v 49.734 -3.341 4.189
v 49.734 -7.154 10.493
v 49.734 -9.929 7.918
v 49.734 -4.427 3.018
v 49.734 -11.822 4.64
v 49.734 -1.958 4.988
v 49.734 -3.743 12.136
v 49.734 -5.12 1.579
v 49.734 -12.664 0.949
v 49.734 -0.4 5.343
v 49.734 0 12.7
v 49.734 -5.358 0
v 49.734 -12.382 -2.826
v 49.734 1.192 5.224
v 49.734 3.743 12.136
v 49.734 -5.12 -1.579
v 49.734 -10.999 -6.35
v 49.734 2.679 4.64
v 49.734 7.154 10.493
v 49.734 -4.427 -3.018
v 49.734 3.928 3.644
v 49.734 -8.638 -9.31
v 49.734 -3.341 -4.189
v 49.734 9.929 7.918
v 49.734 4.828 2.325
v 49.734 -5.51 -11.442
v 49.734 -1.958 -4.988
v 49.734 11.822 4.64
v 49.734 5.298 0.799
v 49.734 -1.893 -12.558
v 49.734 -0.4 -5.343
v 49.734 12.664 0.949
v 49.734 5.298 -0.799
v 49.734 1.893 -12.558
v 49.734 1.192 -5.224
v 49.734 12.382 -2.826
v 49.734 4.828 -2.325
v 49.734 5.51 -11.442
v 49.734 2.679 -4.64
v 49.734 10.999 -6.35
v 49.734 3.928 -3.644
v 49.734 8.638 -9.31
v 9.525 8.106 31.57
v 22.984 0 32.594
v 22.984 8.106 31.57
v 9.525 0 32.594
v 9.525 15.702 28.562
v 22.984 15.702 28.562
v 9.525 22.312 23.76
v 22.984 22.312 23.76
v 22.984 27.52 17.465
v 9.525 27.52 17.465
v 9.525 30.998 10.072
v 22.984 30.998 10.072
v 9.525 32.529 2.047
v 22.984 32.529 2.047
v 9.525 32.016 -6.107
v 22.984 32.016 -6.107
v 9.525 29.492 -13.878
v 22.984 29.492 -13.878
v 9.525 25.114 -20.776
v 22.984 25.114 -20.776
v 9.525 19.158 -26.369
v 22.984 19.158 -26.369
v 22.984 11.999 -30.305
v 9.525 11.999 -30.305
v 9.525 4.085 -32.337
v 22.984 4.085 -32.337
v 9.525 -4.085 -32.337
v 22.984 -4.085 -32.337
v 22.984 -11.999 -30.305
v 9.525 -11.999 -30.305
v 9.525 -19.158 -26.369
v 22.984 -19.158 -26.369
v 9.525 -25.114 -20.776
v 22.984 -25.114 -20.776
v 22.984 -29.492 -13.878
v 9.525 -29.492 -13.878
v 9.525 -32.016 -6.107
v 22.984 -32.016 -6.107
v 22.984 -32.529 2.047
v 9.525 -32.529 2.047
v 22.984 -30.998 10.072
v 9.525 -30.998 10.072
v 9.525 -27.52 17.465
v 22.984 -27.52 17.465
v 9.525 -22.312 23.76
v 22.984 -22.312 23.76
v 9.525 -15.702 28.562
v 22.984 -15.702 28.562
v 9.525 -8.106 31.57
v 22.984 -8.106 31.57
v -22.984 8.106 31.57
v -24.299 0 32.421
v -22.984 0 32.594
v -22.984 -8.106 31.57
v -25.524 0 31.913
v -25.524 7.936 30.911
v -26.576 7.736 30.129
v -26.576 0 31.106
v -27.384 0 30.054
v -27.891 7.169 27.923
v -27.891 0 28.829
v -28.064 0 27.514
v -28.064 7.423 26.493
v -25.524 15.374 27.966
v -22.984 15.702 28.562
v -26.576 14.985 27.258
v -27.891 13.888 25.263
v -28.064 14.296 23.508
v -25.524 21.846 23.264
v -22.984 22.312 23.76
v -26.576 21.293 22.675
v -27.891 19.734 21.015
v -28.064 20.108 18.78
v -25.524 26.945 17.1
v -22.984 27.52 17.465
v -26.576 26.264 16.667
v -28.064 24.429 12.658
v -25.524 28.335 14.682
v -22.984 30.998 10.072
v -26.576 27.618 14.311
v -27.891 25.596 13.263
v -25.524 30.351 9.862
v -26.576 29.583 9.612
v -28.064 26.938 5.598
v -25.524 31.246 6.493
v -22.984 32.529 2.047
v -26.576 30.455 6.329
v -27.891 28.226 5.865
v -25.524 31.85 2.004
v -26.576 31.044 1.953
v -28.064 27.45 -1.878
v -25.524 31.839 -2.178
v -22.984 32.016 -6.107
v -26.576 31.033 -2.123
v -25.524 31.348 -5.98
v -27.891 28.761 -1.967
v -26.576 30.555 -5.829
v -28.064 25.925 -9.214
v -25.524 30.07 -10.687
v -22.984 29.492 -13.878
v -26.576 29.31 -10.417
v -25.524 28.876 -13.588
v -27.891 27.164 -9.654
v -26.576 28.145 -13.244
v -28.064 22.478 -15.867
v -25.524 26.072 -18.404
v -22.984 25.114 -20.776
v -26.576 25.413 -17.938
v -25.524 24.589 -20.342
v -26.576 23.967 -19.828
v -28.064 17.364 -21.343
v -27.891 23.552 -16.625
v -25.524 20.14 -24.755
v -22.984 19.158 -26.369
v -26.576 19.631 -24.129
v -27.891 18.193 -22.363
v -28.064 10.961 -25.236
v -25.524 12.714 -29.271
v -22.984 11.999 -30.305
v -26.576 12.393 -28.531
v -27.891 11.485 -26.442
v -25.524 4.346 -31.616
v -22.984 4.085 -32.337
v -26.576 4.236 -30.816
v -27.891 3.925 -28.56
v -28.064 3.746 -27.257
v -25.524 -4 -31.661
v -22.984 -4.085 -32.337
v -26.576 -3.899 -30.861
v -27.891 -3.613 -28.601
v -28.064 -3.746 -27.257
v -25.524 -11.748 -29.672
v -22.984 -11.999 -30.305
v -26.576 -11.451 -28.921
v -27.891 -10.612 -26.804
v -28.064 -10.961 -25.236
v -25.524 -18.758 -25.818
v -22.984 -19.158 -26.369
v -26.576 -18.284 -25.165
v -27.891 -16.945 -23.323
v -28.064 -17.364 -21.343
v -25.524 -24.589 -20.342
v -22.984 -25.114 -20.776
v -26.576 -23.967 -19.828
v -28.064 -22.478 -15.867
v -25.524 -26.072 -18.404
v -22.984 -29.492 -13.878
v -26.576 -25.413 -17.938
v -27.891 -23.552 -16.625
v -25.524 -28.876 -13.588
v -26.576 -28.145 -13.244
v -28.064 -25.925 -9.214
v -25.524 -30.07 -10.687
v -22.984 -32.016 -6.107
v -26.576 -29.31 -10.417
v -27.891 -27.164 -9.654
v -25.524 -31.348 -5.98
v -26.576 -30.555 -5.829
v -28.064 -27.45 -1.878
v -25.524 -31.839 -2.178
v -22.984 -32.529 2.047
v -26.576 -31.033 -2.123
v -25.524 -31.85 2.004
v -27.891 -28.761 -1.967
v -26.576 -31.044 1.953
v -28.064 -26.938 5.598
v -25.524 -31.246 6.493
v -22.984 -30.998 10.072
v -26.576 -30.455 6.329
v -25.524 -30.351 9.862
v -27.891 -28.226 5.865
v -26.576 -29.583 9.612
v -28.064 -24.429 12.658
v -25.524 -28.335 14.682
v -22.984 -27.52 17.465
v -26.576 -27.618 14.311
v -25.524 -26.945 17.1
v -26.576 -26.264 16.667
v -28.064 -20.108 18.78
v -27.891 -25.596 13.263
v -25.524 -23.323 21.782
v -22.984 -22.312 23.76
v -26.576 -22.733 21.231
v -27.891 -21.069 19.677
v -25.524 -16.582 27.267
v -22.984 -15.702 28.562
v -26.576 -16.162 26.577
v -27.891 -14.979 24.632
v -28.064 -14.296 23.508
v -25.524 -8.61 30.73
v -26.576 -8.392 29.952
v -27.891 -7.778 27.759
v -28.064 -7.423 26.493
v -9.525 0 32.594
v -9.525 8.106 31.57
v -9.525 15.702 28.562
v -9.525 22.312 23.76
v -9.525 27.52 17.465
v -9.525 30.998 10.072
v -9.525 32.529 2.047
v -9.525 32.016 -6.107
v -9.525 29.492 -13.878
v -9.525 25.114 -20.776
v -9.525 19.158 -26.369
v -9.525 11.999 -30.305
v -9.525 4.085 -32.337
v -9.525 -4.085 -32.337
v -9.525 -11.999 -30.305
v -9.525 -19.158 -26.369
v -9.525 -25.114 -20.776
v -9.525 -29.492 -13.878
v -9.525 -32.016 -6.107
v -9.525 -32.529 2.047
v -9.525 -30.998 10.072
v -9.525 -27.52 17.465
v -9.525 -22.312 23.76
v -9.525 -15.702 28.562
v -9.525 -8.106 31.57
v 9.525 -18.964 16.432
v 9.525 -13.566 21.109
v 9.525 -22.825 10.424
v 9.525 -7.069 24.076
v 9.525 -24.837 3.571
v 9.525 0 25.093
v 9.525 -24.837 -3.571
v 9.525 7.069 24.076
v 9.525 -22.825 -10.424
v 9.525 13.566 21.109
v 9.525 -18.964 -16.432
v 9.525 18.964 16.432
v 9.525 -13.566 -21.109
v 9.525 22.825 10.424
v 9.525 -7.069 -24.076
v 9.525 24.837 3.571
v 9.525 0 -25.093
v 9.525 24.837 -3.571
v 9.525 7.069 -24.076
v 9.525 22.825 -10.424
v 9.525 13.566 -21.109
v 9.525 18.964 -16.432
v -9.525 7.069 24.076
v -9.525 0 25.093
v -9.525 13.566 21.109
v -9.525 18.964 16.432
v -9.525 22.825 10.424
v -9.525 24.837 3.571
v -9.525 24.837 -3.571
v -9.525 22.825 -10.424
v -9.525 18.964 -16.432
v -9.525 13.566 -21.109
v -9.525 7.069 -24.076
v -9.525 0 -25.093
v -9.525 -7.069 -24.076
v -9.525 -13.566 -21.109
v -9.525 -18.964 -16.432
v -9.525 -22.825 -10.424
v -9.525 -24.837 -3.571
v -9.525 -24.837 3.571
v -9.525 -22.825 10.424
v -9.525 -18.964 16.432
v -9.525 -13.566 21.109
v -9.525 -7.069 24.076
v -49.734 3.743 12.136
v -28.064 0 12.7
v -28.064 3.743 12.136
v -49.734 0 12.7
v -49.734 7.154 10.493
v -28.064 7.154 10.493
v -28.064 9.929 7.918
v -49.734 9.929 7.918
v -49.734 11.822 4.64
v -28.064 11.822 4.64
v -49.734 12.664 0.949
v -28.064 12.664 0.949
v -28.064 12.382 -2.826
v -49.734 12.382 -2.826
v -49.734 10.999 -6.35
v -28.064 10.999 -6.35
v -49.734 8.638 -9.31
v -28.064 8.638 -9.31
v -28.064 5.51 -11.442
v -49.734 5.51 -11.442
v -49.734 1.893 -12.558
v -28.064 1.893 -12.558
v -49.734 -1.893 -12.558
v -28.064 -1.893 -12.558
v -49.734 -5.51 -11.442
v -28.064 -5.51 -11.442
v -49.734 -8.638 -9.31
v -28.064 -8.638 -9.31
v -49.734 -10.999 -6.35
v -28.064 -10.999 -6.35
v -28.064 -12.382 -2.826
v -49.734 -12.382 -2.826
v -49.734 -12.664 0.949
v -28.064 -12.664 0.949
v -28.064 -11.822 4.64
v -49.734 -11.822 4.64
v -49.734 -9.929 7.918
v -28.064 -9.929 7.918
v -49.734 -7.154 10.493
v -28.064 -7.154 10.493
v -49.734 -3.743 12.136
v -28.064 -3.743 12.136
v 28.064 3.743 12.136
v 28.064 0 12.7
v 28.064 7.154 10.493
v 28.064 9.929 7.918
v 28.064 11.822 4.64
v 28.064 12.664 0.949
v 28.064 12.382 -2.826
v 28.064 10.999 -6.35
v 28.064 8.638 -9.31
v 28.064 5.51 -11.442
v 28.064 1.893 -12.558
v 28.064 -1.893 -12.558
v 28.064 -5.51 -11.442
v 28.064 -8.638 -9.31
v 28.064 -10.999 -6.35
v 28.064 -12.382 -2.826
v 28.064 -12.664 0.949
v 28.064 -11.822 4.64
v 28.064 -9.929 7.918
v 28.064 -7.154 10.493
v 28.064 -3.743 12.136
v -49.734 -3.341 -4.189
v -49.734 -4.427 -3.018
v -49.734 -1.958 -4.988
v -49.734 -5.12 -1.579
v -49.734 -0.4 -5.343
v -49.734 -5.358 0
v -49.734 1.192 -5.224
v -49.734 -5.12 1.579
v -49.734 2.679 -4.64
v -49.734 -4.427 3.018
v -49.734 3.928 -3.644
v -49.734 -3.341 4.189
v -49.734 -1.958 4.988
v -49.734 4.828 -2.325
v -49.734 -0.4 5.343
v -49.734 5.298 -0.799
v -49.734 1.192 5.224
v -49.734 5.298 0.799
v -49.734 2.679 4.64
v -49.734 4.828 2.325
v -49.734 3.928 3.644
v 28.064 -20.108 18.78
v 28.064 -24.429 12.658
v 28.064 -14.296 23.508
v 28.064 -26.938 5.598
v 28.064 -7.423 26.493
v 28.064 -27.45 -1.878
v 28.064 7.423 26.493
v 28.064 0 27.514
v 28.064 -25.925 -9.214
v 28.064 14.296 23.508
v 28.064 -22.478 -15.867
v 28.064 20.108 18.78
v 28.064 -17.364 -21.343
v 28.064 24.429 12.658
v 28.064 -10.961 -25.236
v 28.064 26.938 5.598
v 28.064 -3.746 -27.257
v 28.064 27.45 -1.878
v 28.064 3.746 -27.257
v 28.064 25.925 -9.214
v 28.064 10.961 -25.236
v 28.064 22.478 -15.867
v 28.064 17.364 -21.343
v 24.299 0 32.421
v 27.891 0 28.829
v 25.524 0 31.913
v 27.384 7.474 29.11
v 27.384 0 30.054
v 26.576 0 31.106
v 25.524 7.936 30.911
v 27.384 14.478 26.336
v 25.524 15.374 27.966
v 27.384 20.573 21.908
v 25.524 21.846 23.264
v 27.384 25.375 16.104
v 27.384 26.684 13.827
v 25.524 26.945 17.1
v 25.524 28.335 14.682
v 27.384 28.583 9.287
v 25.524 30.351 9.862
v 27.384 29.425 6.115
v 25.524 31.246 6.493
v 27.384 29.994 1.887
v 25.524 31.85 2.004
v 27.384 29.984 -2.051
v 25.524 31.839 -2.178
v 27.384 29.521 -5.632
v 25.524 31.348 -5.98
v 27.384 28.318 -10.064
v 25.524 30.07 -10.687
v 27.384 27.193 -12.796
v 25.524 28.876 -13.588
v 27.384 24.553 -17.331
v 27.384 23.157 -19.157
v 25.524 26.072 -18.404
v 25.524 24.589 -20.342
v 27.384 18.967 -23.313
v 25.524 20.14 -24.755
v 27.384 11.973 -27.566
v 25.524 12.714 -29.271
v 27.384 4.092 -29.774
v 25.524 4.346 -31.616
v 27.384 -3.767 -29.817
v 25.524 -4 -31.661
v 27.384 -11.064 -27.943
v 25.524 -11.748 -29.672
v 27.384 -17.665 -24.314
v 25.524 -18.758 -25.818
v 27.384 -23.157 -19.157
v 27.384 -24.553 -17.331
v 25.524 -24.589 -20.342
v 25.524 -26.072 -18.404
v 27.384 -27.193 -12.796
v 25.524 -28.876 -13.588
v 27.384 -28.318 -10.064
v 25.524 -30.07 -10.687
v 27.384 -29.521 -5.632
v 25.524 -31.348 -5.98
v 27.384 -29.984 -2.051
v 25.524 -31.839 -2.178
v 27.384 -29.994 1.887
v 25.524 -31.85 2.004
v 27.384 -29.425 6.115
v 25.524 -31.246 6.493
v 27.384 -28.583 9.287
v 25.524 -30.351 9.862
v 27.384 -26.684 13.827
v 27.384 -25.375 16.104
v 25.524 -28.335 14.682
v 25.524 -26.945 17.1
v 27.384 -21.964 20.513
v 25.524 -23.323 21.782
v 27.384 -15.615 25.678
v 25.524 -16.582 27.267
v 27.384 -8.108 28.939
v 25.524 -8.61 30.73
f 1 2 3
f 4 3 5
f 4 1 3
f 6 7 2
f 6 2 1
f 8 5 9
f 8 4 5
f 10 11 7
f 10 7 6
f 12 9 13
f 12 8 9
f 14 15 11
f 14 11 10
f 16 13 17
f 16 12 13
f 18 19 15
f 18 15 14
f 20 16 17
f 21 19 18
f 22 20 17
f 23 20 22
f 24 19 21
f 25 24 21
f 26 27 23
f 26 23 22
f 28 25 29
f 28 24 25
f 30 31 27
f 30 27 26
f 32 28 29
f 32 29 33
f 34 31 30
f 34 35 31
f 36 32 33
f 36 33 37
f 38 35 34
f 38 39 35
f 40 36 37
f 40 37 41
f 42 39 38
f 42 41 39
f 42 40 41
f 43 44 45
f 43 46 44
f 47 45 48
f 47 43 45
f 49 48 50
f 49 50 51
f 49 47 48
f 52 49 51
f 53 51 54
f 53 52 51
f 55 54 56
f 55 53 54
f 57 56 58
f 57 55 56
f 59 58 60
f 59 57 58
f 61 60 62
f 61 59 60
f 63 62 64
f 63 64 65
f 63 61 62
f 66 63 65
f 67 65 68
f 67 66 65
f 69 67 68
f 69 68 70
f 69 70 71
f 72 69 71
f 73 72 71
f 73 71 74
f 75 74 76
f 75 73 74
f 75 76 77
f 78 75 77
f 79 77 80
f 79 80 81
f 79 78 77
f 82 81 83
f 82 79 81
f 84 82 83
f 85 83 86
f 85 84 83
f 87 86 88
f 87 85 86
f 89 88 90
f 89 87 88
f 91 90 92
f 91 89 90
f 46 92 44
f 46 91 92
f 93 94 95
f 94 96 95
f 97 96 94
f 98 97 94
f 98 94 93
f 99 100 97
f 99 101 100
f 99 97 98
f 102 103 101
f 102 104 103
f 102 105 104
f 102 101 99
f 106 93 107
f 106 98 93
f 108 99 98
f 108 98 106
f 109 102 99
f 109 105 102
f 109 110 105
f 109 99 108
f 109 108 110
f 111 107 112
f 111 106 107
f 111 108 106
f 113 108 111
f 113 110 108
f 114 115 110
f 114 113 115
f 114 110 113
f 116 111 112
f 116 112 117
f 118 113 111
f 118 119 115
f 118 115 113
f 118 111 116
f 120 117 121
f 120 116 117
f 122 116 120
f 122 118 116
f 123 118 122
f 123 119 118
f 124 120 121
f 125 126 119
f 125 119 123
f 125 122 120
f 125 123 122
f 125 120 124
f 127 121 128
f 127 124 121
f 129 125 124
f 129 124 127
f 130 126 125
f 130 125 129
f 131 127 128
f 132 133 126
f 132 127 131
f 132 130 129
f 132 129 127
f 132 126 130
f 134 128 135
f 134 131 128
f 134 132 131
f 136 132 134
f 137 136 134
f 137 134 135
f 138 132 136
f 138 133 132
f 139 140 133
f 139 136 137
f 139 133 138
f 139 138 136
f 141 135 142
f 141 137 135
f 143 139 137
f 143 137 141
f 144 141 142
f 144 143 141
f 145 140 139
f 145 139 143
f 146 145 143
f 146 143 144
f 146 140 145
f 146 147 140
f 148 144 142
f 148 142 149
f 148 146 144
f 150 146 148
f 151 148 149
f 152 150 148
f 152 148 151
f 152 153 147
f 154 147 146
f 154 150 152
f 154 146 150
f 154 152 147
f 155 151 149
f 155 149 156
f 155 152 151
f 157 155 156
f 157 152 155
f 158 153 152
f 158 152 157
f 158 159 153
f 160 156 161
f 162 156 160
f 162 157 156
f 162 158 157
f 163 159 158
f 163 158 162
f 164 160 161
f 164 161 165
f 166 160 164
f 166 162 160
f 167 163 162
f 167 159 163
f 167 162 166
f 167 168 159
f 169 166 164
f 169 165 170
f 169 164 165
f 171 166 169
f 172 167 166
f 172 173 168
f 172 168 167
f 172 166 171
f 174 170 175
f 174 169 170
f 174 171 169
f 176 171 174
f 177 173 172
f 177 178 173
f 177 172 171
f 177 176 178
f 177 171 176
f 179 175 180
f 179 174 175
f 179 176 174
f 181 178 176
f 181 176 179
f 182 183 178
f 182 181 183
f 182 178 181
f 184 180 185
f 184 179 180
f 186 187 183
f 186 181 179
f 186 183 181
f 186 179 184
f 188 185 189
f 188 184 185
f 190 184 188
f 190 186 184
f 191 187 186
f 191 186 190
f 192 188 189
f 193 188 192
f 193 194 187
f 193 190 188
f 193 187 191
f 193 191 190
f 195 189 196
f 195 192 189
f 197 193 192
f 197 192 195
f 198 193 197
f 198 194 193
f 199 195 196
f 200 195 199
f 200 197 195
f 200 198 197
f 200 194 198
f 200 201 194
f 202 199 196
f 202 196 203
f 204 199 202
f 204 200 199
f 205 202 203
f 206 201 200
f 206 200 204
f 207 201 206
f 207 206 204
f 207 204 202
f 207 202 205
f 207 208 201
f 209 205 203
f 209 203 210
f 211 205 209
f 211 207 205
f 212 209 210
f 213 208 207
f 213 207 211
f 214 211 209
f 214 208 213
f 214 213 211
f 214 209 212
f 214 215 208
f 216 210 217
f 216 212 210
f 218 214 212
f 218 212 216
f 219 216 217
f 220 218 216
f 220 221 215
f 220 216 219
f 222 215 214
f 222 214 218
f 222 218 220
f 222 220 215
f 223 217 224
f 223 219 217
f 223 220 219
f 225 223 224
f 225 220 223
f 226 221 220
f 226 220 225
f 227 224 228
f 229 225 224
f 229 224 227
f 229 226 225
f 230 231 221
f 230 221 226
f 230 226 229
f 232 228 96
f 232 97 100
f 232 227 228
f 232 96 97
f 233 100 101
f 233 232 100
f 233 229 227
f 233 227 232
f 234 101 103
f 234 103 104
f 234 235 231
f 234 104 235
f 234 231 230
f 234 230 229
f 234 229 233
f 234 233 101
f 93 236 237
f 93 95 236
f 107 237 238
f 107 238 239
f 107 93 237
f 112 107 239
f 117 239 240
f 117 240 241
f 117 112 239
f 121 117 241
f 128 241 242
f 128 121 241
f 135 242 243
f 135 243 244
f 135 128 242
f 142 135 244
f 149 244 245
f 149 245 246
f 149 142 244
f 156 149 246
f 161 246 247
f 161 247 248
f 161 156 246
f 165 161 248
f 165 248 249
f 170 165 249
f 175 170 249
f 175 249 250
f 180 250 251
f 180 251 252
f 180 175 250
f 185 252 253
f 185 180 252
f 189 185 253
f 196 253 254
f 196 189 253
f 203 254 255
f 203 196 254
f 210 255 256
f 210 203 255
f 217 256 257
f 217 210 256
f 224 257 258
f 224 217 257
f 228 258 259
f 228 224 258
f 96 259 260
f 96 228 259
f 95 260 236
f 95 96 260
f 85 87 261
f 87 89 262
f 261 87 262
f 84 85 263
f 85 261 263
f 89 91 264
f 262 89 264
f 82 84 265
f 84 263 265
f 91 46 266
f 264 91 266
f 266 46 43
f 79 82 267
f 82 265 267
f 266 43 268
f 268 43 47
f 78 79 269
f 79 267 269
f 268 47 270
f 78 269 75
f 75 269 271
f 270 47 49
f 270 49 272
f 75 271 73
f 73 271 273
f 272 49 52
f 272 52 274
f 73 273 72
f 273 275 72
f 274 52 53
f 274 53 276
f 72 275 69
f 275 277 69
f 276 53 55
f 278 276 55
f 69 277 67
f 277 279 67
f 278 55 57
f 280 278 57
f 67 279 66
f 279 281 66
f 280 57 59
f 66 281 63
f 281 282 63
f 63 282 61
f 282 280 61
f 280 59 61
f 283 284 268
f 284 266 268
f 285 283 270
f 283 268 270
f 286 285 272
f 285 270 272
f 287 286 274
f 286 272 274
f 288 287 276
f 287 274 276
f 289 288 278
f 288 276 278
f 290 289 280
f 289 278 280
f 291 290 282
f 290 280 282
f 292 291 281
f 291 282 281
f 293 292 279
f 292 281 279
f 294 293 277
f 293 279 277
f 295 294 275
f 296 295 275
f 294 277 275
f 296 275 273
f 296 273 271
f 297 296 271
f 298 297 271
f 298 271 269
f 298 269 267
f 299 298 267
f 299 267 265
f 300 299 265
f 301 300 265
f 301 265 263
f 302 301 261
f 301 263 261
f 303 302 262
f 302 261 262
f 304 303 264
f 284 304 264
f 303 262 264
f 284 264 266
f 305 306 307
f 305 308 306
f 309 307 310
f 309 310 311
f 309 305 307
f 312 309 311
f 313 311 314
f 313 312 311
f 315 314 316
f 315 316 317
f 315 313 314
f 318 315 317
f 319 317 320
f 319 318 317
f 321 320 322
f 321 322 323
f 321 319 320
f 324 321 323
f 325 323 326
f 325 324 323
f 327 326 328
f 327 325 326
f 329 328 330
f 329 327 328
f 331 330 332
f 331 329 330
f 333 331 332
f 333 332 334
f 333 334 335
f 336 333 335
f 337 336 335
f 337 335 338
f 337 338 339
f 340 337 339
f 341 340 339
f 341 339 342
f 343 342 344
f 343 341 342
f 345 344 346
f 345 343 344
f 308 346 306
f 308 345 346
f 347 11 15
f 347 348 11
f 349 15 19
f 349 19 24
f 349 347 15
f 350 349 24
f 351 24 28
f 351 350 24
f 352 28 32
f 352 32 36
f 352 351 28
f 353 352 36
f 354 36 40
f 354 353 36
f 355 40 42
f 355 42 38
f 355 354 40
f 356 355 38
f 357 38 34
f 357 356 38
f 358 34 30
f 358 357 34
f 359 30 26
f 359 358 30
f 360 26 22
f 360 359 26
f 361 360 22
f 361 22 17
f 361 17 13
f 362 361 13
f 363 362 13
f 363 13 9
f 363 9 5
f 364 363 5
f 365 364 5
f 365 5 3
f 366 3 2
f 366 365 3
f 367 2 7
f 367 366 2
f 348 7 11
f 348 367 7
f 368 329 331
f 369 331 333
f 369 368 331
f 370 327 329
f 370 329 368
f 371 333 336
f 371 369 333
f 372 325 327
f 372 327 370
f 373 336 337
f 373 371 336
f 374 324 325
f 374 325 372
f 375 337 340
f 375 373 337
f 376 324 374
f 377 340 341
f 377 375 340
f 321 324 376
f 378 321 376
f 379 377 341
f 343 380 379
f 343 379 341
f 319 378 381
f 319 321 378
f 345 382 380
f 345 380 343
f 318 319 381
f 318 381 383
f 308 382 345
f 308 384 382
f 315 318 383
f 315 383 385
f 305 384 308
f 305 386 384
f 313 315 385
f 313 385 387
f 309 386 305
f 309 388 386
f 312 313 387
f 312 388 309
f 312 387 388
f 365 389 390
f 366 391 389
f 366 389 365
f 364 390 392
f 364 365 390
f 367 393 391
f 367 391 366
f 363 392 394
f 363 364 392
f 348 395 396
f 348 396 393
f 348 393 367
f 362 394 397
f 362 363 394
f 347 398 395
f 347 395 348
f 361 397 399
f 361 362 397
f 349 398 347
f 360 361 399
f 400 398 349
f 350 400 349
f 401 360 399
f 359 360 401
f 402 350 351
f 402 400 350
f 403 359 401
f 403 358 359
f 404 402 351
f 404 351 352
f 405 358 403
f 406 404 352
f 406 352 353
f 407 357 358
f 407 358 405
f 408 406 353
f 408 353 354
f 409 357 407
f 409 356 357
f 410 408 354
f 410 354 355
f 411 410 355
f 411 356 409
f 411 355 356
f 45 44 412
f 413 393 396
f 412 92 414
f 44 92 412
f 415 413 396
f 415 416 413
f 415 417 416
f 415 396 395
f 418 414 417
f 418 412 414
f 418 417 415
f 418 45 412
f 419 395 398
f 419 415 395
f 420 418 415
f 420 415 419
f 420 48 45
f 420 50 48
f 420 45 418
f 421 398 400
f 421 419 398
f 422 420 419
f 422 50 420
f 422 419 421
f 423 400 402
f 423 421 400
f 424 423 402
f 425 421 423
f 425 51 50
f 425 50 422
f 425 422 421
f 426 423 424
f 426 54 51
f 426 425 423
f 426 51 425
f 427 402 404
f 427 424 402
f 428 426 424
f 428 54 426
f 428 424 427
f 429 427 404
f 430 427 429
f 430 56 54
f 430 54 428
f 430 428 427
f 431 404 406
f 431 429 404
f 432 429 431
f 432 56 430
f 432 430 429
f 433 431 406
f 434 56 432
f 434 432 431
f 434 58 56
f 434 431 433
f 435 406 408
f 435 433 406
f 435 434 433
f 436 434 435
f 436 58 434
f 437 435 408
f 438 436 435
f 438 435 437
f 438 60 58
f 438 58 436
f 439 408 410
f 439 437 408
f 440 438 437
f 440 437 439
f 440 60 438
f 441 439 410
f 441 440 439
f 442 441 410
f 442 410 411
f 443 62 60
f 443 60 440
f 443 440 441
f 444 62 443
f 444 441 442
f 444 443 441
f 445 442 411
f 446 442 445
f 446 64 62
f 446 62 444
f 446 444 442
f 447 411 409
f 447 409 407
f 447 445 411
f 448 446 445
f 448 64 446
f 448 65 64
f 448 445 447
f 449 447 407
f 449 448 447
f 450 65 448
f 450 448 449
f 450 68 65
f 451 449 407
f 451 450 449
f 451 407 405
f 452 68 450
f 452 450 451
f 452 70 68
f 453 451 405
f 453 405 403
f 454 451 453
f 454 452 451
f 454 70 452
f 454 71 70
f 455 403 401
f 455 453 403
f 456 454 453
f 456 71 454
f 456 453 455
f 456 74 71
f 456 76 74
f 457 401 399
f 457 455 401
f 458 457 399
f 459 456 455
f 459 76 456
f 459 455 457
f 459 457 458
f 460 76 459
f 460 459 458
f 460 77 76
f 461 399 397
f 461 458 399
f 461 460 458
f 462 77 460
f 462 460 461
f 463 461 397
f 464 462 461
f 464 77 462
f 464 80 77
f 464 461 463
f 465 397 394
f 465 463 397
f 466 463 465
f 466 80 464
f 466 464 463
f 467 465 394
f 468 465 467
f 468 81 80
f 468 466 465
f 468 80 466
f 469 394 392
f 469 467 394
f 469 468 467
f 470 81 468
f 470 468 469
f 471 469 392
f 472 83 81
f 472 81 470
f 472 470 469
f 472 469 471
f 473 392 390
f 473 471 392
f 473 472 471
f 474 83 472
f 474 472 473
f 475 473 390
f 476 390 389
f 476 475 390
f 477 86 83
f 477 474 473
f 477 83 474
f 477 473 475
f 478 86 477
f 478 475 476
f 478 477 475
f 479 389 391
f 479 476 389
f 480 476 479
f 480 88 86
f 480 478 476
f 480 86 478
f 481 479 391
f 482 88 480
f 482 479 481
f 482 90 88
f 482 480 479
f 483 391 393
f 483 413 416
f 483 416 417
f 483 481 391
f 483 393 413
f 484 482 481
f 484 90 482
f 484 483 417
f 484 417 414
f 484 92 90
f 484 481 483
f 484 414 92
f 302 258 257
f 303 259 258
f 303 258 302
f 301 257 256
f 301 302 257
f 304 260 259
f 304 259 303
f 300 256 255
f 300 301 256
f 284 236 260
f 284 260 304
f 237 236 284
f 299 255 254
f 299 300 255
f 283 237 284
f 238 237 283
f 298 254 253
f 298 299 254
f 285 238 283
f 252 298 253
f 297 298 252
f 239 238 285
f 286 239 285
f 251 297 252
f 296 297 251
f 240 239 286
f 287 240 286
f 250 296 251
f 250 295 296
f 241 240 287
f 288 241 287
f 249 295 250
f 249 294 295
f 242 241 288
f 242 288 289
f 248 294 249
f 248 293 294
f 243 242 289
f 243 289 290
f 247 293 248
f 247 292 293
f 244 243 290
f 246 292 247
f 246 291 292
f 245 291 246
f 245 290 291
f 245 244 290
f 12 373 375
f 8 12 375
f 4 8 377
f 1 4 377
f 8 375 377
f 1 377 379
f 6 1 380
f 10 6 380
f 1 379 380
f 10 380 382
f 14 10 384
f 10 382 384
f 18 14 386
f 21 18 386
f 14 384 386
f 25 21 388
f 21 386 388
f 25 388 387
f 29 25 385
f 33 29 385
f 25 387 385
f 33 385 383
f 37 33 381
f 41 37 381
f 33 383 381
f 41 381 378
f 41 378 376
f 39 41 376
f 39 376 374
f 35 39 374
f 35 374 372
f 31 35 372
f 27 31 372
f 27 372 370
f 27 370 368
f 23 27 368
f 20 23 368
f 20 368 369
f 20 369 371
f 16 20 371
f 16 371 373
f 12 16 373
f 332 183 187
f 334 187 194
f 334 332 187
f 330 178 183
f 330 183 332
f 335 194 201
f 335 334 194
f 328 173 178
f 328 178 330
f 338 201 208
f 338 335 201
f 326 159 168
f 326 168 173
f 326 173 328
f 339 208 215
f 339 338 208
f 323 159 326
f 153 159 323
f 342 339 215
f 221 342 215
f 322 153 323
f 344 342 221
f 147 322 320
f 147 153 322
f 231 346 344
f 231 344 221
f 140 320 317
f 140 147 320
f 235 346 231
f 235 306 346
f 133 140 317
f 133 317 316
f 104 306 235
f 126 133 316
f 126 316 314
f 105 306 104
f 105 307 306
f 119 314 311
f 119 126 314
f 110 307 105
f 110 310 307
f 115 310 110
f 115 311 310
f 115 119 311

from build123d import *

# Parameters (mm, degrees)
F2_R = 5.08
F3_W = 19.05
F3_H = 9.8322601712
F6_D = 10.71626


with BuildPart() as f1:
    # F0 (on Front) → F1 (revolve)
    with BuildSketch(Plane.XZ):
        Polygon((-49.7342673447, 12.7), (-49.7342673447, 0), (49.7342673447, 0), (49.7342673447, 12.7), (28.0643354135, 12.7), (28.0643354135, 32.593707693), (-28.0643354135, 32.593707693), (-28.0643354135, 12.7), align=None)
    revolve(axis=Axis((0, 0, 0), (-1, 0, 0)))

    # F2
    f2_edges = [f1.edges().sort_by_distance(p)[0] for p in [
        (28.064335, 0, -32.593708),
        (-28.064335, 0, -32.593708),
    ]]
    fillet(f2_edges, radius=F2_R)

    # F3 (on Front) → F4 (revolve, cut)
    with BuildSketch(Plane.XZ):
        with Locations((0, 30.0088699144)):
            Rectangle(F3_W, F3_H)
    revolve(axis=Axis((28.0643354135, 0, 0), (-1, 0, 0)), mode=Mode.SUBTRACT)

    # F6 (through all)
    with Locations(Plane.YZ.offset(49.7342673447)):
        with Locations((0, 0)):
            Hole(F6_D / 2)


solid = f1.part
